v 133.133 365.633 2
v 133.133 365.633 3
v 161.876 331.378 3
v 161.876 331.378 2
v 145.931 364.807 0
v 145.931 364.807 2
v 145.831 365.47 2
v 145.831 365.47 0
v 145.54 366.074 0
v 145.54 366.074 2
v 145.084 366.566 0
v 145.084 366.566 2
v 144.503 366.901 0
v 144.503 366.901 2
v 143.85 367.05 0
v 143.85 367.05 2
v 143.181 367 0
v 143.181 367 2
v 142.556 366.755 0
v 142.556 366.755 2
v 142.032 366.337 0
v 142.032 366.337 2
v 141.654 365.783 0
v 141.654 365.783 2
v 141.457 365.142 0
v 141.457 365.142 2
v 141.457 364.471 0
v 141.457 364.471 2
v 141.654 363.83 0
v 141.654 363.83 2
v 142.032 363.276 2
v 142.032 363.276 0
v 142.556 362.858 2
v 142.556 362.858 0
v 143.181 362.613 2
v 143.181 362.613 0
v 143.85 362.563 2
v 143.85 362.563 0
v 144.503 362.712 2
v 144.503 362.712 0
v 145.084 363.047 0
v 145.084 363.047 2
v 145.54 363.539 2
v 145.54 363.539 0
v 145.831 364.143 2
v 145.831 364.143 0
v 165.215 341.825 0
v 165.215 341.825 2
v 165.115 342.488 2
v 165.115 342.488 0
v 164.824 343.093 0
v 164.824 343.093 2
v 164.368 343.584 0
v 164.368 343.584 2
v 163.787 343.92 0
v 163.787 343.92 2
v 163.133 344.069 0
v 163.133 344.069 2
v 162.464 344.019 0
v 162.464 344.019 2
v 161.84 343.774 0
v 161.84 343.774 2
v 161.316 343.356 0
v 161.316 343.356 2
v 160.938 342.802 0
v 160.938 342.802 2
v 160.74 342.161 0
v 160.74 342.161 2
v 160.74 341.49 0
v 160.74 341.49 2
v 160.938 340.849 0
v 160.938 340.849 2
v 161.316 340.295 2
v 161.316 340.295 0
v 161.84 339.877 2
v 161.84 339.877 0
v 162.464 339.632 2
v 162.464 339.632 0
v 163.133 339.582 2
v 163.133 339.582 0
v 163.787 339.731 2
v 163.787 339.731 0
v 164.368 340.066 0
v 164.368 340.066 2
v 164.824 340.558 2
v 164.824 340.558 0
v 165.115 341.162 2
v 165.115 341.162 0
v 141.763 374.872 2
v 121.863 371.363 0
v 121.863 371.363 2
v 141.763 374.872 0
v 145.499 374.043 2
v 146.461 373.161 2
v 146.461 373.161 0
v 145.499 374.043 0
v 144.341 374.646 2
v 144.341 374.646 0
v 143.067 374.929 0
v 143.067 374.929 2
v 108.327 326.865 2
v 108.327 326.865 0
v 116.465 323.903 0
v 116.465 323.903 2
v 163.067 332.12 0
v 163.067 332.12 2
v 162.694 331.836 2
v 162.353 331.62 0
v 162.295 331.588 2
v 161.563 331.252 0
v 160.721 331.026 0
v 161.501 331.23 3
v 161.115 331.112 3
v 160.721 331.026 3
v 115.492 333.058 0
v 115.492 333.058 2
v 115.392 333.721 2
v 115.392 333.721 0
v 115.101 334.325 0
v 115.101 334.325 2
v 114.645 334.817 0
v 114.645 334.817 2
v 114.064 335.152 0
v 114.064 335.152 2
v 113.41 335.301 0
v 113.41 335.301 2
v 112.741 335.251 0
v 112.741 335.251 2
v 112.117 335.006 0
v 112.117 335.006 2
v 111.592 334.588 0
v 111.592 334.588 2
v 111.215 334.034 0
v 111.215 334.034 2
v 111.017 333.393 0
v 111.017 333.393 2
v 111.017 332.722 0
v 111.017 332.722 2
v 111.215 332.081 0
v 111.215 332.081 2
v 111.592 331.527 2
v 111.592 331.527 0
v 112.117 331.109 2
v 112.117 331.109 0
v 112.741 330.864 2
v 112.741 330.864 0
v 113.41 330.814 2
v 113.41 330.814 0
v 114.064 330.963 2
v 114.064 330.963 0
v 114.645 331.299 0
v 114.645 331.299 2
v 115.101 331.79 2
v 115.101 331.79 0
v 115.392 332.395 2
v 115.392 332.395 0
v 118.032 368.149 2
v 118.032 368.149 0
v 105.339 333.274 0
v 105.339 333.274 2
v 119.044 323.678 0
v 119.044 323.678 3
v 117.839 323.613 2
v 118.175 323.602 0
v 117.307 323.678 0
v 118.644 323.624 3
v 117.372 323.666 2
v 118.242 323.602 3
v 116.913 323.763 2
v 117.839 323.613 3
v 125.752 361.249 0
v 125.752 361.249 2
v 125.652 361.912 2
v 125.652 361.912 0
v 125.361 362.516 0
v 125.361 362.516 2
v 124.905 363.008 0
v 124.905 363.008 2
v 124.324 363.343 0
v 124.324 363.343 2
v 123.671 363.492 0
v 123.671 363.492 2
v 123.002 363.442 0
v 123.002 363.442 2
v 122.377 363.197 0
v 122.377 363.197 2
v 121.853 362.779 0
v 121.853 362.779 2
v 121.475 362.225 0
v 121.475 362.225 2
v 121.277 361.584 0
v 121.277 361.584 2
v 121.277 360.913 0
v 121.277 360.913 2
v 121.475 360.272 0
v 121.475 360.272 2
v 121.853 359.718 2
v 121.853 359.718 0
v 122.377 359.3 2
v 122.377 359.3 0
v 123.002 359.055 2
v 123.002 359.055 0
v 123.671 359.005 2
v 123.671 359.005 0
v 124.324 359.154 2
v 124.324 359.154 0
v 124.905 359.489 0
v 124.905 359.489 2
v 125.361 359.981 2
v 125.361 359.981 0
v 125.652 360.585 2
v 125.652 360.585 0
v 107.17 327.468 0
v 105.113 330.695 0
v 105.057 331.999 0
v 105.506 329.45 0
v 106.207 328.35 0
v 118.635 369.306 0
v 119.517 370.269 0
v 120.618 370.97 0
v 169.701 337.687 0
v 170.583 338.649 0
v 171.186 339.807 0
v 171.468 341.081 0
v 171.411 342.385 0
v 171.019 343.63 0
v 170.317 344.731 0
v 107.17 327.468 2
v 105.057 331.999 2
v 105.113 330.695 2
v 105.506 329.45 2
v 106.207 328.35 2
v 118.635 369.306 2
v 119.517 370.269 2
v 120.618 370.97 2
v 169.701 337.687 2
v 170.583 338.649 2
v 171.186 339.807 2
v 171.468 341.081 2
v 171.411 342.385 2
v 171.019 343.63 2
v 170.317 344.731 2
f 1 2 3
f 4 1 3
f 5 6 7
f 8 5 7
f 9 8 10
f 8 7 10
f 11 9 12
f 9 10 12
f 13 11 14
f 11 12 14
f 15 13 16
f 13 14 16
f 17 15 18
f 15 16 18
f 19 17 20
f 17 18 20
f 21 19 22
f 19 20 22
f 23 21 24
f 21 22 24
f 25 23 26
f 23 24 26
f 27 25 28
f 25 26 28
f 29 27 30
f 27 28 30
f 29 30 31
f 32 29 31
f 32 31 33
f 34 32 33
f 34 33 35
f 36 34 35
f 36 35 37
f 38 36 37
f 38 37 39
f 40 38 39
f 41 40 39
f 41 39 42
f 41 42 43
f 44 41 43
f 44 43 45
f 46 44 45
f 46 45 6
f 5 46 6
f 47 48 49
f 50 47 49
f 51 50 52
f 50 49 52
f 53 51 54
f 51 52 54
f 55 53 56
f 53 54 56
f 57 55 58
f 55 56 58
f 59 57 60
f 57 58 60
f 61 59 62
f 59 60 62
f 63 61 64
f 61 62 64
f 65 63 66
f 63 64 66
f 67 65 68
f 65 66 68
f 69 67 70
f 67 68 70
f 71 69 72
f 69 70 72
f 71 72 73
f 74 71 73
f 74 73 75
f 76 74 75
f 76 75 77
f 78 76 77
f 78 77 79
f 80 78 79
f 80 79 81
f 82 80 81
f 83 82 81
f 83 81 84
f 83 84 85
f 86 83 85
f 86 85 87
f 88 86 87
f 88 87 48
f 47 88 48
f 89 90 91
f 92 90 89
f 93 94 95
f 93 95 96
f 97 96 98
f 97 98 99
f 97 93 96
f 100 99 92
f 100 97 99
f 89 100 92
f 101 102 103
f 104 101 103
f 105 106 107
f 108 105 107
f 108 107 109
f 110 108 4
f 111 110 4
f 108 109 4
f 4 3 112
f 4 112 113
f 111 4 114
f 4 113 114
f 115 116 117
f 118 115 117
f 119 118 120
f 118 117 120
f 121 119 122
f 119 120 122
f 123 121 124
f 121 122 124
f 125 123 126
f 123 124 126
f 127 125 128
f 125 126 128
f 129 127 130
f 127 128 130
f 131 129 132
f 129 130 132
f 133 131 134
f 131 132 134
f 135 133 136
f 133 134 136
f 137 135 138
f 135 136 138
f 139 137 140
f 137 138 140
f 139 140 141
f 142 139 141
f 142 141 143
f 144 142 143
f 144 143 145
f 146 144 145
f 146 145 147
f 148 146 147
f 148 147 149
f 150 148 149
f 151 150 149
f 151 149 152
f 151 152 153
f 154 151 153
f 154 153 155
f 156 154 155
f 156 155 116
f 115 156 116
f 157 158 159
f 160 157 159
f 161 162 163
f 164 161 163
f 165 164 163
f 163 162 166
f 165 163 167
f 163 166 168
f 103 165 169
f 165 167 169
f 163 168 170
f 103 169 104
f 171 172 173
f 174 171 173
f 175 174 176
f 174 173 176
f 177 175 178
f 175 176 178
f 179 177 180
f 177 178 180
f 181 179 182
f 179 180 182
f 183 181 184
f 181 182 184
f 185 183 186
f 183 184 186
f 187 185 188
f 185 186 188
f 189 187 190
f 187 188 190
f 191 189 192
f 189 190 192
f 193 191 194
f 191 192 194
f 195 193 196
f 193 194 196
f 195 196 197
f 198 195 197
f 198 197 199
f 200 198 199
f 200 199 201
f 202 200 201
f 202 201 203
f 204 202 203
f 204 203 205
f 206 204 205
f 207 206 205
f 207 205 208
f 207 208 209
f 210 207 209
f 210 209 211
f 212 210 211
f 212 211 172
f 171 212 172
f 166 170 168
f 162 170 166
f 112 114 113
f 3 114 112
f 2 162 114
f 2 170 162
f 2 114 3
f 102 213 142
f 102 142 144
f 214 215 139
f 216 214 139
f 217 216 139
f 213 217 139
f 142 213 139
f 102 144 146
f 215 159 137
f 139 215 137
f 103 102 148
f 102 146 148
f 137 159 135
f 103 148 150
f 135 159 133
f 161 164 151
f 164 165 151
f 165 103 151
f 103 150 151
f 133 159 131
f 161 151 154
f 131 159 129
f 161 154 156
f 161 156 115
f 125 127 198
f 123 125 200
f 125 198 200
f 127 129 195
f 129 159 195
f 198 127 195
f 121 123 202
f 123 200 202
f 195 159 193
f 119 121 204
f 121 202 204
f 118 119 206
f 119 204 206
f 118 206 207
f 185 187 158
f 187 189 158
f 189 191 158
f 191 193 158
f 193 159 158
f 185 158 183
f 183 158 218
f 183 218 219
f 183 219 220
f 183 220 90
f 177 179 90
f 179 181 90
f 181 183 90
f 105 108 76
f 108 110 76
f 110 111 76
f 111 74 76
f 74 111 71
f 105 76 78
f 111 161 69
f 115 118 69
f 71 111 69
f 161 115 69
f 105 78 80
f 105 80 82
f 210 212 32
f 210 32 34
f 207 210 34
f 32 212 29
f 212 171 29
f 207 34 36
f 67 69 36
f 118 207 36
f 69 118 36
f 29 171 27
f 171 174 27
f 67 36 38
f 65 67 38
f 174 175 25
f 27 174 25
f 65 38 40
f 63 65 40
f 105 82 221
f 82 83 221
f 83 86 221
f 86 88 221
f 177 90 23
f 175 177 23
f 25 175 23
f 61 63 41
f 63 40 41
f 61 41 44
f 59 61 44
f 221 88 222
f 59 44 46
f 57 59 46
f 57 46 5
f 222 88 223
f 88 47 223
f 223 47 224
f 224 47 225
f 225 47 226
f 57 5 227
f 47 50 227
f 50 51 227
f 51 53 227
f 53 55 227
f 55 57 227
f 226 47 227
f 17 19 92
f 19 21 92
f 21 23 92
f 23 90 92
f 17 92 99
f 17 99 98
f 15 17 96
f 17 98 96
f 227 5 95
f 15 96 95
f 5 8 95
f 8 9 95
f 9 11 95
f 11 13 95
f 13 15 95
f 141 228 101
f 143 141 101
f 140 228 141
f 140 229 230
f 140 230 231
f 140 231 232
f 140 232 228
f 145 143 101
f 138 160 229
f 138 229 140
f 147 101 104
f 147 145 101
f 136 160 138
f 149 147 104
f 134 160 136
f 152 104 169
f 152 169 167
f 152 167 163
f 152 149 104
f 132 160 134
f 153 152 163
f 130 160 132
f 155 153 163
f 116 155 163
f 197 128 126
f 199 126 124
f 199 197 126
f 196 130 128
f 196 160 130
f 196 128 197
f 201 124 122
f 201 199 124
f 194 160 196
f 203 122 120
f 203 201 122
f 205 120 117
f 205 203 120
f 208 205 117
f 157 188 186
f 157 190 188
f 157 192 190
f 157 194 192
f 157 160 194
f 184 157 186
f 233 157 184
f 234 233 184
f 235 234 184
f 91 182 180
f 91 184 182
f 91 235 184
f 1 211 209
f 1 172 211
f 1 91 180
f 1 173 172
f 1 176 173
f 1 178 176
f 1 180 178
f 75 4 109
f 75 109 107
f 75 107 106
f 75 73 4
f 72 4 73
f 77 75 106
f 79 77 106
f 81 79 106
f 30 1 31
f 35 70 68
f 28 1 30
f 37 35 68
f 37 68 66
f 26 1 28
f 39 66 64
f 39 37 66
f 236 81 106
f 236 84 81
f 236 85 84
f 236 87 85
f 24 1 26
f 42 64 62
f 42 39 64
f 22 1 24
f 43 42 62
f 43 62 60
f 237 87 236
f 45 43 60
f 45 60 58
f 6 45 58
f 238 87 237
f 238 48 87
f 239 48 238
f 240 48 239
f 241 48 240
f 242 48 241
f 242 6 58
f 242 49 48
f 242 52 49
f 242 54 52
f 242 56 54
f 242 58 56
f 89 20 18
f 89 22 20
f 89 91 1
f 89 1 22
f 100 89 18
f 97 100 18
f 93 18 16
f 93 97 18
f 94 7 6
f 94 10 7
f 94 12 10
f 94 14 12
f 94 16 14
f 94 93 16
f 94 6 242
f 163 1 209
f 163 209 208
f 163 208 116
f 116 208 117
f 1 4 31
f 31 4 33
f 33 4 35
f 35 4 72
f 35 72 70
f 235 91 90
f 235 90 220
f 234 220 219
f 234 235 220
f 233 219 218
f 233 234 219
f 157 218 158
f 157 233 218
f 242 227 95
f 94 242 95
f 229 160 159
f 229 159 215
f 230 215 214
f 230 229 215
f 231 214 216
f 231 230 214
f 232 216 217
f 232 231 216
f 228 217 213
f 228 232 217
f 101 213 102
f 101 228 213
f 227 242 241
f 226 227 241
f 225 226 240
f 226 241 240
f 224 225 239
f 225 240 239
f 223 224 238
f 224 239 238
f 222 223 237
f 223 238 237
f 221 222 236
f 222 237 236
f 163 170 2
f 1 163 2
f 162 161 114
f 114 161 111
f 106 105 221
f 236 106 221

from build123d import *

# Parameters (mm, degrees)
EXTRUDE_1_DEPTH     = 3
SKETCH_2_R          = 2.25
CUT_EXTRUDE_1_DEPTH = 3
FILLET_1_R          = 5
CUT_EXTRUDE_2_DEPTH = 1


with BuildPart() as part:
    # ｽｹｯﾁ1 → ﾎﾞｽ - 押し出し1 (new body)
    with BuildSketch(Plane.XY):
        Polygon((173.531323483, 340.900859956), (144.605881047, 375.372859896), (133.1152144, 365.731045751), (119.019825089, 370.861347901), (103.628918639, 328.575179965), (117.724307951, 323.444877815), (162.040656836, 331.259045811), align=None)
        Polygon((144.605881047, 375.372859896), (133.1152144, 365.731045751), (119.019825089, 370.861347901), align=None)
    extrude(amount=EXTRUDE_1_DEPTH)

    # ｽｹｯﾁ2 → ｶｯﾄ - 押し出し1 (cut)
    with BuildSketch(Plane.XY.offset(3)):
        with Locations((113.24176437, 333.057723546)):
            Circle(SKETCH_2_R)
        with Locations((123.50236867, 361.24850217)):
            Circle(SKETCH_2_R)
        with Locations((143.681454796, 364.8066195)):
            Circle(SKETCH_2_R)
        with Locations((162.965083087, 341.825286207)):
            Circle(SKETCH_2_R)
    extrude(amount=-CUT_EXTRUDE_1_DEPTH, mode=Mode.SUBTRACT)

    # ﾌｨﾚｯﾄ1
    fillet_1_edges = [part.edges().sort_by_distance(p)[0] for p in [
        (173.531323483, 340.900859956, 1.5),
        (162.040656836, 331.259045811, 1.5),
        (117.724307951, 323.444877815, 1.5),
        (103.628918639, 328.575179965, 1.5),
        (119.019825089, 370.861347901, 1.5),
        (144.605881047, 375.372859896, 1.5),
    ]]
    fillet(fillet_1_edges, radius=FILLET_1_R)

    # ｽｹｯﾁ3 → ｶｯﾄ - 押し出し2 (cut)
    with BuildSketch(Plane.XY.offset(3)):
        Polygon((121.413966092, 377.439196246), (103.628918639, 328.575179965), (117.771292582, 323.427776808), (133.132579218, 365.632564976), (162.002354614, 331.22690643), (173.531323483, 340.900859956), (140.106367779, 380.735170998), (131.711632891, 373.691152049), align=None)
    extrude(amount=-CUT_EXTRUDE_2_DEPTH, mode=Mode.SUBTRACT)


solid = part.part
